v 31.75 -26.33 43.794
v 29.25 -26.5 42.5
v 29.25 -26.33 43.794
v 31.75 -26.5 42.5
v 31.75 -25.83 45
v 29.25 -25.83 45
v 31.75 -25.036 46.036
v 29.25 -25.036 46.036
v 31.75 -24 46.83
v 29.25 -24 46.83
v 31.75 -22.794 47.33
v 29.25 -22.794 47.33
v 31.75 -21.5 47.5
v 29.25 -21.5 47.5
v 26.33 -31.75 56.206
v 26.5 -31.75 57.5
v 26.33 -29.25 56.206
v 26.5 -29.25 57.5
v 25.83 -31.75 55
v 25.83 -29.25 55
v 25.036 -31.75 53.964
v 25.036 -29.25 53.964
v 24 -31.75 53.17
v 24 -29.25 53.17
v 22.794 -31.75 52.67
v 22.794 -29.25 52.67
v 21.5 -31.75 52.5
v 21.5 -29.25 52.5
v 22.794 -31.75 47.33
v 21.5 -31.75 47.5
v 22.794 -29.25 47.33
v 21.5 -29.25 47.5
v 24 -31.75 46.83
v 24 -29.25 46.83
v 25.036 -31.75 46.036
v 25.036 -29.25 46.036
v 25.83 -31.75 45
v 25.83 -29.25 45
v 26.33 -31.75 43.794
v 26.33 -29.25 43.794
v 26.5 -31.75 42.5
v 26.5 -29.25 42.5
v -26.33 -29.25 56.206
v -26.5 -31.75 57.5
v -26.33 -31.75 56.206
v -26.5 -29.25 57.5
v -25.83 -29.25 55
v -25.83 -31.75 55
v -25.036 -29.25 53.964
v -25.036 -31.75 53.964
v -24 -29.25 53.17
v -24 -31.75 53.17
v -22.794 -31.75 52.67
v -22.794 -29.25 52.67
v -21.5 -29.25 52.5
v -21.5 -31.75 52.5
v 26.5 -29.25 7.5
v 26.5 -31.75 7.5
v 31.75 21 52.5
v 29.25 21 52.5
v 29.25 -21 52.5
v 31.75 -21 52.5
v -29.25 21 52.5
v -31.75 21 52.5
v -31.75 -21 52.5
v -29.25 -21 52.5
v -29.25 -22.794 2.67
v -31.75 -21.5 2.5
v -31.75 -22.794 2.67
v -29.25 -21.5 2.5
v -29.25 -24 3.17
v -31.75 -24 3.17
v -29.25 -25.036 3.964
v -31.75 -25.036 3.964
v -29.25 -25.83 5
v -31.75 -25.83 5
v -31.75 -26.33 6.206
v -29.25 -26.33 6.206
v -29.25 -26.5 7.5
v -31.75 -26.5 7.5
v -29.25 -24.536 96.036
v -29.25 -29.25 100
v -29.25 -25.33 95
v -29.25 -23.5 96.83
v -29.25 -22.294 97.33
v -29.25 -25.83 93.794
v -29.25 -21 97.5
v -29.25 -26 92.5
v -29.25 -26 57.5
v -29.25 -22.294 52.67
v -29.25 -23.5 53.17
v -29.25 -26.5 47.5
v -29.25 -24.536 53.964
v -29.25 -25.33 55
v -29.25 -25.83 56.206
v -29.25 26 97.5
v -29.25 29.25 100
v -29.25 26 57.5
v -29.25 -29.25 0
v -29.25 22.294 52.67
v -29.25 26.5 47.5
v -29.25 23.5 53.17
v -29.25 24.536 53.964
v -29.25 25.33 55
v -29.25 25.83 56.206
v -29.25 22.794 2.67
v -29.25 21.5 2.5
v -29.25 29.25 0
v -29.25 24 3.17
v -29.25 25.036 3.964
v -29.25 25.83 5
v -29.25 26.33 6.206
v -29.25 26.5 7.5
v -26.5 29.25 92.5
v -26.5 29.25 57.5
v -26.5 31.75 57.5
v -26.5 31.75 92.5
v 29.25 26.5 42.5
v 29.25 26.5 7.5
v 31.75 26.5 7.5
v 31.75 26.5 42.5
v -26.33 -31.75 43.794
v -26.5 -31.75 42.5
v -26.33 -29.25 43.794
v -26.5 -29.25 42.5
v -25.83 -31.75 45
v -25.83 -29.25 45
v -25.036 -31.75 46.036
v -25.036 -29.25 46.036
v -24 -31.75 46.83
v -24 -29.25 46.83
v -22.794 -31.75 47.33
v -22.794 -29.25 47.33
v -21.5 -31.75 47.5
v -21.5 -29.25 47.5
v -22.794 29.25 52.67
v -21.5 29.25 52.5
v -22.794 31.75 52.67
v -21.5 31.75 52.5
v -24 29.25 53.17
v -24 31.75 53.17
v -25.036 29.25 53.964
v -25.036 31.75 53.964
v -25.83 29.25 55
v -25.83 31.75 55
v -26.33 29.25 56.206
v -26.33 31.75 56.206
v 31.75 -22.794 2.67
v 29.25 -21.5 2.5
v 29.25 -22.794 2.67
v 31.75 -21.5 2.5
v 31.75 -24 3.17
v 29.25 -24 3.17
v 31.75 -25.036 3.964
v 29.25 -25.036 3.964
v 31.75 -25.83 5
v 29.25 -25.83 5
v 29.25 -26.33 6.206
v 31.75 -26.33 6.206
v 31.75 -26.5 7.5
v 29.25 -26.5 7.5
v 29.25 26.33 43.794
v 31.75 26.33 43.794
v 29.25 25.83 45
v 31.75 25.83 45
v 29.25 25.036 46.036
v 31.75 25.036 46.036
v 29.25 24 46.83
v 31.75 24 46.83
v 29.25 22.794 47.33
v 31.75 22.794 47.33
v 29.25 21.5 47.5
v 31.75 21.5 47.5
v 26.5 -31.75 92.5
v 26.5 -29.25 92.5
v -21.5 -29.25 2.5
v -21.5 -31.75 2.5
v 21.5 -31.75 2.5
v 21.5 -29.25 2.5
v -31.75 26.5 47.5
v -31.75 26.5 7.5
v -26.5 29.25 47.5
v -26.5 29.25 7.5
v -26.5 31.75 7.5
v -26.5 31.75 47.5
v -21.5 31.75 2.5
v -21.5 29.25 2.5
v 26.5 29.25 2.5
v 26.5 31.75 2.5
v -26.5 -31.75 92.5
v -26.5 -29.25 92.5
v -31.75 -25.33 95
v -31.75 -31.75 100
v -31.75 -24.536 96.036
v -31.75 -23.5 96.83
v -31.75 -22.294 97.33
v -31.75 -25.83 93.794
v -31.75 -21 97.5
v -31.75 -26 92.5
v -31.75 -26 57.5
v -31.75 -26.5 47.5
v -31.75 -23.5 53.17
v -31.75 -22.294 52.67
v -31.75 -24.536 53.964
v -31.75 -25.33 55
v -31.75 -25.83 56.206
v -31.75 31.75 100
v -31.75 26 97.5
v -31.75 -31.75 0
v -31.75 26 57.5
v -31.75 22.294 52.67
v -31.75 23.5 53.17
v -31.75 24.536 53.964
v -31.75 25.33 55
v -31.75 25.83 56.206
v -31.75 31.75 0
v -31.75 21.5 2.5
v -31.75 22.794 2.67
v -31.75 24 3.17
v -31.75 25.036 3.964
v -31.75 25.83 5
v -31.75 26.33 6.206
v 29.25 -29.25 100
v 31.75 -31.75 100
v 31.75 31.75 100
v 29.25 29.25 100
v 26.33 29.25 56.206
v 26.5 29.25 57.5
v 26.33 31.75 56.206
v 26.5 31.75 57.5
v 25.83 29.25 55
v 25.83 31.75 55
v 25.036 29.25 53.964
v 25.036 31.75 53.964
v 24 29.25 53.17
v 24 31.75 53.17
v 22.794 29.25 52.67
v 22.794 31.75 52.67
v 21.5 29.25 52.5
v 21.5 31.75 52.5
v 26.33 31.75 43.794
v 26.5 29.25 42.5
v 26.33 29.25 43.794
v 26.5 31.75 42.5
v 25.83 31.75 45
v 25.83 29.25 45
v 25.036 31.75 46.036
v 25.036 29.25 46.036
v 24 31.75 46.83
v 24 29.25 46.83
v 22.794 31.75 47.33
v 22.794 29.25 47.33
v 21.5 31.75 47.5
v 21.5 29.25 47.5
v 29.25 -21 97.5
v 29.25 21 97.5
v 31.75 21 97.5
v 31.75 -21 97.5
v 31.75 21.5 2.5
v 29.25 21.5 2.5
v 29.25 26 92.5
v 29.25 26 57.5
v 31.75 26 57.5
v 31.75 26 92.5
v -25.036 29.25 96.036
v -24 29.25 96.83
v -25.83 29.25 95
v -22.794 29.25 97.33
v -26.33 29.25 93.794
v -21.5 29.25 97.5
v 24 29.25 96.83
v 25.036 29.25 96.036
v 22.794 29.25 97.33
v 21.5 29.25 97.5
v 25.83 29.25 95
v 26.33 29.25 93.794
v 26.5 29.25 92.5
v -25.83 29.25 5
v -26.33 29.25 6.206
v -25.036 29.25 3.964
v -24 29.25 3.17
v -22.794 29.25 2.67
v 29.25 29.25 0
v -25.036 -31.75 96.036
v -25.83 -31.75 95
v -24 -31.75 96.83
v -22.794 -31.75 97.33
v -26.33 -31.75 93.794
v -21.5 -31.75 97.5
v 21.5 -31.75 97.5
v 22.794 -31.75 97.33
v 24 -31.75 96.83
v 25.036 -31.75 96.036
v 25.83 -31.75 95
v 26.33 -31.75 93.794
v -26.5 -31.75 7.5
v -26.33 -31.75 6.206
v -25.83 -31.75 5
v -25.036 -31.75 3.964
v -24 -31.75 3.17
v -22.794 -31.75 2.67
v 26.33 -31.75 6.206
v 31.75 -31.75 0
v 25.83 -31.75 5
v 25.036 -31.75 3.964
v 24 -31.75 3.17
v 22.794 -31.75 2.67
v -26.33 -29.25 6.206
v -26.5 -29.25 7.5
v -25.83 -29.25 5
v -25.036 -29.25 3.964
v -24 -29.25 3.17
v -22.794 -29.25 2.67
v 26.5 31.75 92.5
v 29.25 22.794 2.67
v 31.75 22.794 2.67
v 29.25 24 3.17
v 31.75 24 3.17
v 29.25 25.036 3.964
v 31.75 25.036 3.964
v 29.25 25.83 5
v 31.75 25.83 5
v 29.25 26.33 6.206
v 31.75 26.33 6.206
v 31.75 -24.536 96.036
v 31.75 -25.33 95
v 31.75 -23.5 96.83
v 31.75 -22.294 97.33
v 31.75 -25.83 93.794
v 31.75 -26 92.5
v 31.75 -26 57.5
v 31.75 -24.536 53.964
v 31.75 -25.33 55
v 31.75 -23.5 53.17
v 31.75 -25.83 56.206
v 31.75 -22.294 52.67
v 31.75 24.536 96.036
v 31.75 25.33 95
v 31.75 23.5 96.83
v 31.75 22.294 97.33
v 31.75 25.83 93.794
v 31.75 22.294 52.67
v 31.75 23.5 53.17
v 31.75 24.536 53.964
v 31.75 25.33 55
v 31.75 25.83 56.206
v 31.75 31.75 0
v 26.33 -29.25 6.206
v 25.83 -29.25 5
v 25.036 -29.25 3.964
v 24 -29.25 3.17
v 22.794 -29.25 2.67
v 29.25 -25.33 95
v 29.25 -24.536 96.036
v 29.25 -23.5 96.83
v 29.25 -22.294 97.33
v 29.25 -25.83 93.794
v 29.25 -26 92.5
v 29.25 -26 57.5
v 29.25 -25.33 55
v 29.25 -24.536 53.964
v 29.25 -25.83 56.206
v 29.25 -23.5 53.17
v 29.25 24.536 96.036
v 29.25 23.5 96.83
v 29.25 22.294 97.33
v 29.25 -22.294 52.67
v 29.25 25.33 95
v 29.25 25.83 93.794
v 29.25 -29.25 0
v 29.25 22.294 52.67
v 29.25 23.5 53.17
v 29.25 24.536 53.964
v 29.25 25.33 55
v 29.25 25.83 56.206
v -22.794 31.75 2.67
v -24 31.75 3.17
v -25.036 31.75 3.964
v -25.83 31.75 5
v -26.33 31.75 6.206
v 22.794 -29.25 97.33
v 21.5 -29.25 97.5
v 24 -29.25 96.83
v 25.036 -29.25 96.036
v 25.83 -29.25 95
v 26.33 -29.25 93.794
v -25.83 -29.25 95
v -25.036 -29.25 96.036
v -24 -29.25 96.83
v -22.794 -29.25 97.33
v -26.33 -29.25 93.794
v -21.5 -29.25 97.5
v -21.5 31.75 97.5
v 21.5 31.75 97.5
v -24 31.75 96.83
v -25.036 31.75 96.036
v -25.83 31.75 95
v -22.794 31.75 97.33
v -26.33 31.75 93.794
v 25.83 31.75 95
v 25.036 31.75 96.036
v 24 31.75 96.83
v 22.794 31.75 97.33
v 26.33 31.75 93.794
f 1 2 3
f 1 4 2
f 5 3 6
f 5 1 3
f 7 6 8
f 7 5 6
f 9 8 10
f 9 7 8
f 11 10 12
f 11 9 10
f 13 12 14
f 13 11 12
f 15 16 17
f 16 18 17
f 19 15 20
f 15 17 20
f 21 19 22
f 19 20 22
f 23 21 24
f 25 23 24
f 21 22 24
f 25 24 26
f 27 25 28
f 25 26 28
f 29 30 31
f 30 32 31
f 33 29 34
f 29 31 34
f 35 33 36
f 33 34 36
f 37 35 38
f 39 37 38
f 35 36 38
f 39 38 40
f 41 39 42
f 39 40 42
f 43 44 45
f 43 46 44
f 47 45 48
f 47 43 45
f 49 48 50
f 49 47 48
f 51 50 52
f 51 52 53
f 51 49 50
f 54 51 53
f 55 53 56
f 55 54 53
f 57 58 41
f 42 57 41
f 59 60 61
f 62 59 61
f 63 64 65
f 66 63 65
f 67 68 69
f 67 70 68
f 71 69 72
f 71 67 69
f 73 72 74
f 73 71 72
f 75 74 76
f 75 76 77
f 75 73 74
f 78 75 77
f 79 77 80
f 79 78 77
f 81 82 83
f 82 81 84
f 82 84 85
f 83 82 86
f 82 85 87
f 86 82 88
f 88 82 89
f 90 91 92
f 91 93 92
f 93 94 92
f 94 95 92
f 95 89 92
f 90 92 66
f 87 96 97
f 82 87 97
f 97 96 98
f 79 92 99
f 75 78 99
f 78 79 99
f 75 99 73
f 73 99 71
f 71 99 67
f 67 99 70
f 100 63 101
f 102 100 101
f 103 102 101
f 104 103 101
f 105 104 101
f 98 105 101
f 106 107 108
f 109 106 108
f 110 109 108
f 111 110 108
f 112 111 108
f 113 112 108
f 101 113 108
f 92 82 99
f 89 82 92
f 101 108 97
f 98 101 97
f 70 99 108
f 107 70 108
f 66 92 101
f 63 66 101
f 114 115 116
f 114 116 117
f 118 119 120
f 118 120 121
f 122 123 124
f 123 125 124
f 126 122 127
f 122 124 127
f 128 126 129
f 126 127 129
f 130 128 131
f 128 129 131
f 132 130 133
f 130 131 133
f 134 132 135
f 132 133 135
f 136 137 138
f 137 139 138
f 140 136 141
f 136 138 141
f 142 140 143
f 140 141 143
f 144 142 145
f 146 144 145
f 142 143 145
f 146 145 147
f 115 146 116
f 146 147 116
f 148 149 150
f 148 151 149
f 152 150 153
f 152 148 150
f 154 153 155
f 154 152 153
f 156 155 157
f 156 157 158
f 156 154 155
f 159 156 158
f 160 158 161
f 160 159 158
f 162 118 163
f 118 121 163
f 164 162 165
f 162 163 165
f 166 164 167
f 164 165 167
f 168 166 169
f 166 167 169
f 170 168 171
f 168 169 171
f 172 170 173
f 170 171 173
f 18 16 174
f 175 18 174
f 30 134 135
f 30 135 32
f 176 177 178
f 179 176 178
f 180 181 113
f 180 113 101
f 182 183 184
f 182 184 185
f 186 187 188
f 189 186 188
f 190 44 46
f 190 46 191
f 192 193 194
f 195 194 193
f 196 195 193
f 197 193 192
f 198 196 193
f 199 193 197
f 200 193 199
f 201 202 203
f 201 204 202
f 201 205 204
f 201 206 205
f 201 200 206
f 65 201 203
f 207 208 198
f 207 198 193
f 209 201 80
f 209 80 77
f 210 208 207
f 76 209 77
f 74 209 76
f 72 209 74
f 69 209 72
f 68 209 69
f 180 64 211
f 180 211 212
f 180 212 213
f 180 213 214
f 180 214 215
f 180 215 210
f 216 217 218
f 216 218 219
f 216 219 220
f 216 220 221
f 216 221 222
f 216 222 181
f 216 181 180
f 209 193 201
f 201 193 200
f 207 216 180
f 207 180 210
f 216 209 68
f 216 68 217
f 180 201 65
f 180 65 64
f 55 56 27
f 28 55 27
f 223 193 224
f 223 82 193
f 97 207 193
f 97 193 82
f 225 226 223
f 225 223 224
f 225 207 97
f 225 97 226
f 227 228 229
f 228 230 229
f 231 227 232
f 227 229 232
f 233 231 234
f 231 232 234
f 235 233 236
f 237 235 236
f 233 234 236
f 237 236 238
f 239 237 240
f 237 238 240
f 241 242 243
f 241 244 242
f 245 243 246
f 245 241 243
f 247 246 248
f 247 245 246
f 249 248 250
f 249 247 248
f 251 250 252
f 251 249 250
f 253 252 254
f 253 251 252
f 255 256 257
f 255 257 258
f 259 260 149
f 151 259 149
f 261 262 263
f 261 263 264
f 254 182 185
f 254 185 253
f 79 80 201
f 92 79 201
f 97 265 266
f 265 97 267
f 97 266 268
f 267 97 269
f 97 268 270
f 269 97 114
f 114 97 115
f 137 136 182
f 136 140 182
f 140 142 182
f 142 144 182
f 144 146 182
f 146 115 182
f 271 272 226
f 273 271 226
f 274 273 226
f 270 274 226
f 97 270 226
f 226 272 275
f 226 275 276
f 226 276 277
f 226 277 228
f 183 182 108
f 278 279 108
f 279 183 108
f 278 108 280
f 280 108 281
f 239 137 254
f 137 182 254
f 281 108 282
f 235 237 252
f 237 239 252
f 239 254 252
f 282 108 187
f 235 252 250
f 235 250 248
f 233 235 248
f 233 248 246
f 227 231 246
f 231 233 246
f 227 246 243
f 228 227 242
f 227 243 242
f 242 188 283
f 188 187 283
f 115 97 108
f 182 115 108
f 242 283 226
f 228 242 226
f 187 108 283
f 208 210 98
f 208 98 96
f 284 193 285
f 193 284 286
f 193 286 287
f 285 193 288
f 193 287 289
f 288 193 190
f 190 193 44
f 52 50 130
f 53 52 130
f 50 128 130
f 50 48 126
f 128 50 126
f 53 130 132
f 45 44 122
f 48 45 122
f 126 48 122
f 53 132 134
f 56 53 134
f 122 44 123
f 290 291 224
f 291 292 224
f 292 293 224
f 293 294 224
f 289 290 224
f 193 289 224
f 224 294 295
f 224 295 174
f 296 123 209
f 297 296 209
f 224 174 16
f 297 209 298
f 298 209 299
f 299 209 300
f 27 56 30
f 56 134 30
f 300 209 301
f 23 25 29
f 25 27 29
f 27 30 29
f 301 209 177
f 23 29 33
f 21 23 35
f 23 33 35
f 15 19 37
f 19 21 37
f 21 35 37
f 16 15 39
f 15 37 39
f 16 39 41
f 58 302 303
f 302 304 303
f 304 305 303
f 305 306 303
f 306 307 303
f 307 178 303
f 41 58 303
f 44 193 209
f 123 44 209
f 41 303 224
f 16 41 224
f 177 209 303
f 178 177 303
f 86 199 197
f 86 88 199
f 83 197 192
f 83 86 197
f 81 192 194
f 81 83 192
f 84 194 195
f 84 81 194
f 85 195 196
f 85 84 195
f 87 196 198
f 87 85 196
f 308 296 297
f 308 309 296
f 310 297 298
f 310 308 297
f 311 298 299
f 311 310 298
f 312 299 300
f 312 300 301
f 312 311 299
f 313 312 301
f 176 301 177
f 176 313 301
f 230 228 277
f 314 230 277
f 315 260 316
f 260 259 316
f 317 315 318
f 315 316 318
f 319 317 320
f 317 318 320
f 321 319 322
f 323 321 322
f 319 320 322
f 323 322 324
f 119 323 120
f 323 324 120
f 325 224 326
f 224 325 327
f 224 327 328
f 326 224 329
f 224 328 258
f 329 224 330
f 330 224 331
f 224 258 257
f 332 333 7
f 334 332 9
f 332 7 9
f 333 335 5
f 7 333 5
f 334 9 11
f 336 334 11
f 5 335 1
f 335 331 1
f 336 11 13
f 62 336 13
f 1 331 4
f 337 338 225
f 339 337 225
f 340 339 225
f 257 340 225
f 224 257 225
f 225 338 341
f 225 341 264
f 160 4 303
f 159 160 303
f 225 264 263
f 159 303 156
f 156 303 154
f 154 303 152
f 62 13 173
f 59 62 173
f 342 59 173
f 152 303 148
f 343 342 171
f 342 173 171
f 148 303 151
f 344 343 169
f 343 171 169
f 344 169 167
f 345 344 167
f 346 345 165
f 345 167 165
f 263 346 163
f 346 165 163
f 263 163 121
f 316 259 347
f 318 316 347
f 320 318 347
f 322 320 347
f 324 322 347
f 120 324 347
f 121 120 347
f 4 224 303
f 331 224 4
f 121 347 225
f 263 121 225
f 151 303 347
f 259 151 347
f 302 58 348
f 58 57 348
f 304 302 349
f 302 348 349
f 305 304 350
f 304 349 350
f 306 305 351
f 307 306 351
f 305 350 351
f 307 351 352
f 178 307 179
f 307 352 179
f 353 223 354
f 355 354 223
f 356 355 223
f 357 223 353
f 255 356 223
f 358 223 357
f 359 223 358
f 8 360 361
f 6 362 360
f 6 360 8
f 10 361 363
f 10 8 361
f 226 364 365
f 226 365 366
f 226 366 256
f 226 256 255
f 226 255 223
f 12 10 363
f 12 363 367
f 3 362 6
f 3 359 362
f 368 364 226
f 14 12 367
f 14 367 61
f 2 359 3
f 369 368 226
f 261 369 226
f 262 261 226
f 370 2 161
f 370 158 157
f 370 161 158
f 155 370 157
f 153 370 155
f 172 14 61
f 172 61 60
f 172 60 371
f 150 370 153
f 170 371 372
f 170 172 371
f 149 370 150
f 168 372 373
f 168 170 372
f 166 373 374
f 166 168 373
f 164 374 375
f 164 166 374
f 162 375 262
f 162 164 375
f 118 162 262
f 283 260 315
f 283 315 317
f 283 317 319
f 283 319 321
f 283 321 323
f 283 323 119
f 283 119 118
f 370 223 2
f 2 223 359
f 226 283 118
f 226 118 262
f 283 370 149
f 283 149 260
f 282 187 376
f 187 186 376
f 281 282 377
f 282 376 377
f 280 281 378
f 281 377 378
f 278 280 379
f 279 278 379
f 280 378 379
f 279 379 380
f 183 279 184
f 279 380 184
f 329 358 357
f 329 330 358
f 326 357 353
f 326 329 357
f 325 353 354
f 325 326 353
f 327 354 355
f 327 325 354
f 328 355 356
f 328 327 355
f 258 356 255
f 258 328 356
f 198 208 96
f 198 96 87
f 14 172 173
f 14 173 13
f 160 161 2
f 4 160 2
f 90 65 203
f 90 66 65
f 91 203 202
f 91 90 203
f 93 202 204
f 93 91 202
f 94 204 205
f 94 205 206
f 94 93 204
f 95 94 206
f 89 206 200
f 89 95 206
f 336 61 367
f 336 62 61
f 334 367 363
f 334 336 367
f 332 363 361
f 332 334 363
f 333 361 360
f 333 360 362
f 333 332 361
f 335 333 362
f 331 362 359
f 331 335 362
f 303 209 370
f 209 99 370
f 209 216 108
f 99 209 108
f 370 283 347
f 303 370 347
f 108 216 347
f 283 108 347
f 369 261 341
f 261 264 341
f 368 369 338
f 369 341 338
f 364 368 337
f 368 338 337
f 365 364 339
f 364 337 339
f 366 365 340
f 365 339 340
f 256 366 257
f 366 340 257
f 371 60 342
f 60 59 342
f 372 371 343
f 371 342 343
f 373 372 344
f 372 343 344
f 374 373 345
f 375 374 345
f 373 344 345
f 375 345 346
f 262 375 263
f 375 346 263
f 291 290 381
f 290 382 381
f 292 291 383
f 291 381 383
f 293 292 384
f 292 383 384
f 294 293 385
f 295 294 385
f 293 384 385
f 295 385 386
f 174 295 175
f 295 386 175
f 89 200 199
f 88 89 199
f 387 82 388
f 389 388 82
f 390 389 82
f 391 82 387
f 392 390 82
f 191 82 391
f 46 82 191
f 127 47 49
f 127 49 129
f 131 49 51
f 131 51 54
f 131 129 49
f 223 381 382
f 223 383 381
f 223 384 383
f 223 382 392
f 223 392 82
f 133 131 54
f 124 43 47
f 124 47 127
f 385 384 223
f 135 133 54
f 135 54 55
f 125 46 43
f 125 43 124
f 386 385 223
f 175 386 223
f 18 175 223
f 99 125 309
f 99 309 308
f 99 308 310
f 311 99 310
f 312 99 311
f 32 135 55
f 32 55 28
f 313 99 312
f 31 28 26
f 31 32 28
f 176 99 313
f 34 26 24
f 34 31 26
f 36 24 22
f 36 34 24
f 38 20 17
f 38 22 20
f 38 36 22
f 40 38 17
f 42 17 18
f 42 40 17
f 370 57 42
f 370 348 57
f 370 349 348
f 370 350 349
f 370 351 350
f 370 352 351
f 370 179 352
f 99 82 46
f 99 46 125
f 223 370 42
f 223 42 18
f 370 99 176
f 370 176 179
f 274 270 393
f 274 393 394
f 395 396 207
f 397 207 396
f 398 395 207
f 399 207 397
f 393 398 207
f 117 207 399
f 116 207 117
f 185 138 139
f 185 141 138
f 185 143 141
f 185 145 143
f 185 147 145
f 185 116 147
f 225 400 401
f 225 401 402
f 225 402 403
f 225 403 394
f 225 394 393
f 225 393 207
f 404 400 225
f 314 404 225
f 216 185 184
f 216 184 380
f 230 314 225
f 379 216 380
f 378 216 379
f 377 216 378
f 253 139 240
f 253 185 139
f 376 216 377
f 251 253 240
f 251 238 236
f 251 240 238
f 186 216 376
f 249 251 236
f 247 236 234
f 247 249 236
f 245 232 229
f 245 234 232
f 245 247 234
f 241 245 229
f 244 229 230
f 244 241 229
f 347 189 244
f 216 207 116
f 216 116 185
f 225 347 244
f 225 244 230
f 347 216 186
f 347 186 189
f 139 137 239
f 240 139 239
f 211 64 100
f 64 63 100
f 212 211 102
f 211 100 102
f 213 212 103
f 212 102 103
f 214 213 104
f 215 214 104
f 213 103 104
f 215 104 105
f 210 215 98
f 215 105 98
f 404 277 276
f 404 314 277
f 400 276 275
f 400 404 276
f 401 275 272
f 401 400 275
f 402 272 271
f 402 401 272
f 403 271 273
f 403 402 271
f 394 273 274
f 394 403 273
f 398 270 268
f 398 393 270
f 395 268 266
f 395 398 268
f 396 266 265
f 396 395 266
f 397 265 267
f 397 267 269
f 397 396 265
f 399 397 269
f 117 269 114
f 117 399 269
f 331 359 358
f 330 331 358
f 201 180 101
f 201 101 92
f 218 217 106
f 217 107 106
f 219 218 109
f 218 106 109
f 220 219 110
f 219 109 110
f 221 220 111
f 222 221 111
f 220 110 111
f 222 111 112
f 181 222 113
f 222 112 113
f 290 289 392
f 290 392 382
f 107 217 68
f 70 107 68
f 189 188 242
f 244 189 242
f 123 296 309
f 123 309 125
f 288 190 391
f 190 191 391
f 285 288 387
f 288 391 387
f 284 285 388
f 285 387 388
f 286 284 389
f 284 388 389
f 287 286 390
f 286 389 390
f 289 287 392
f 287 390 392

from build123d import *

# Parameters (mm, degrees)
F0_W     = 63.5
F0_H     = 63.5
F0_W_2   = 58.5
F0_H_2   = 58.5
F1_DEPTH = 100
F2_W     = 53
F2_H     = 45
F3_DEPTH = 63.501
F4_W     = 53
F4_H     = 45
F4_W_2   = 52
F5_DEPTH = 63.501
F6_R     = 5
F7_R     = 5


with BuildPart() as f1:
    # F0 (on Top) → F1 (new body)
    with BuildSketch(Plane.XY):
        Rectangle(F0_W, F0_H)
        Rectangle(F0_W_2, F0_H_2, mode=Mode.SUBTRACT)
    extrude(amount=F1_DEPTH)

    # F2 (on face) → F3 (cut, through all)
    with BuildSketch(Plane.XZ.offset(31.75)):
        with Locations((0, 75)):
            Rectangle(F2_W, F2_H)
        with Locations((0, 25)):
            Rectangle(F2_W, F2_H)
    extrude(amount=-F3_DEPTH, mode=Mode.SUBTRACT)

    # F4 (on face) → F5 (cut, through all)
    with BuildSketch(Plane(origin=(-31.75, 0, 0), x_dir=(0, -1, 0), z_dir=(-1, 0, 0))):
        with Locations((0, 25)):
            Rectangle(F4_W, F4_H)
        with Locations((0, 75)):
            Rectangle(F4_W_2, F4_H)
    extrude(amount=-F5_DEPTH, mode=Mode.SUBTRACT)

    # F6
    f6_edges = [f1.edges().sort_by_distance(p)[0] for p in [
        (30.5, -26.5, 2.5),
        (30.5, -26, 52.5),
        (-26.5, 30.5, 2.5),
        (-30.5, 26.5, 2.5),
        (-26.5, -30.5, 2.5),
        (-26.5, -30.5, 52.5),
        (-26.5, 30.5, 52.5),
        (-30.5, 26, 52.5),
        (30.5, 26, 52.5),
        (26.5, -30.5, 2.5),
        (26.5, -30.5, 52.5),
        (26.5, 30.5, 52.5),
        (-30.5, -26.5, 2.5),
        (-30.5, -26, 52.5),
    ]]
    fillet(f6_edges, radius=F6_R)

    # F7
    f7_edges = [f1.edges().sort_by_distance(p)[0] for p in [
        (30.5, 26, 97.5),
        (30.5, 26.5, 47.5),
        (-26.5, -30.5, 47.5),
        (-26.5, -30.5, 97.5),
        (30.5, 26.5, 2.5),
        (-26.5, 30.5, 97.5),
        (26.5, 30.5, 97.5),
        (30.5, -26, 97.5),
        (26.5, -30.5, 97.5),
        (30.5, -26.5, 47.5),
        (26.5, -30.5, 47.5),
        (26.5, 30.5, 47.5),
        (-30.5, -26, 97.5),
    ]]
    fillet(f7_edges, radius=F7_R)


solid = f1.part
